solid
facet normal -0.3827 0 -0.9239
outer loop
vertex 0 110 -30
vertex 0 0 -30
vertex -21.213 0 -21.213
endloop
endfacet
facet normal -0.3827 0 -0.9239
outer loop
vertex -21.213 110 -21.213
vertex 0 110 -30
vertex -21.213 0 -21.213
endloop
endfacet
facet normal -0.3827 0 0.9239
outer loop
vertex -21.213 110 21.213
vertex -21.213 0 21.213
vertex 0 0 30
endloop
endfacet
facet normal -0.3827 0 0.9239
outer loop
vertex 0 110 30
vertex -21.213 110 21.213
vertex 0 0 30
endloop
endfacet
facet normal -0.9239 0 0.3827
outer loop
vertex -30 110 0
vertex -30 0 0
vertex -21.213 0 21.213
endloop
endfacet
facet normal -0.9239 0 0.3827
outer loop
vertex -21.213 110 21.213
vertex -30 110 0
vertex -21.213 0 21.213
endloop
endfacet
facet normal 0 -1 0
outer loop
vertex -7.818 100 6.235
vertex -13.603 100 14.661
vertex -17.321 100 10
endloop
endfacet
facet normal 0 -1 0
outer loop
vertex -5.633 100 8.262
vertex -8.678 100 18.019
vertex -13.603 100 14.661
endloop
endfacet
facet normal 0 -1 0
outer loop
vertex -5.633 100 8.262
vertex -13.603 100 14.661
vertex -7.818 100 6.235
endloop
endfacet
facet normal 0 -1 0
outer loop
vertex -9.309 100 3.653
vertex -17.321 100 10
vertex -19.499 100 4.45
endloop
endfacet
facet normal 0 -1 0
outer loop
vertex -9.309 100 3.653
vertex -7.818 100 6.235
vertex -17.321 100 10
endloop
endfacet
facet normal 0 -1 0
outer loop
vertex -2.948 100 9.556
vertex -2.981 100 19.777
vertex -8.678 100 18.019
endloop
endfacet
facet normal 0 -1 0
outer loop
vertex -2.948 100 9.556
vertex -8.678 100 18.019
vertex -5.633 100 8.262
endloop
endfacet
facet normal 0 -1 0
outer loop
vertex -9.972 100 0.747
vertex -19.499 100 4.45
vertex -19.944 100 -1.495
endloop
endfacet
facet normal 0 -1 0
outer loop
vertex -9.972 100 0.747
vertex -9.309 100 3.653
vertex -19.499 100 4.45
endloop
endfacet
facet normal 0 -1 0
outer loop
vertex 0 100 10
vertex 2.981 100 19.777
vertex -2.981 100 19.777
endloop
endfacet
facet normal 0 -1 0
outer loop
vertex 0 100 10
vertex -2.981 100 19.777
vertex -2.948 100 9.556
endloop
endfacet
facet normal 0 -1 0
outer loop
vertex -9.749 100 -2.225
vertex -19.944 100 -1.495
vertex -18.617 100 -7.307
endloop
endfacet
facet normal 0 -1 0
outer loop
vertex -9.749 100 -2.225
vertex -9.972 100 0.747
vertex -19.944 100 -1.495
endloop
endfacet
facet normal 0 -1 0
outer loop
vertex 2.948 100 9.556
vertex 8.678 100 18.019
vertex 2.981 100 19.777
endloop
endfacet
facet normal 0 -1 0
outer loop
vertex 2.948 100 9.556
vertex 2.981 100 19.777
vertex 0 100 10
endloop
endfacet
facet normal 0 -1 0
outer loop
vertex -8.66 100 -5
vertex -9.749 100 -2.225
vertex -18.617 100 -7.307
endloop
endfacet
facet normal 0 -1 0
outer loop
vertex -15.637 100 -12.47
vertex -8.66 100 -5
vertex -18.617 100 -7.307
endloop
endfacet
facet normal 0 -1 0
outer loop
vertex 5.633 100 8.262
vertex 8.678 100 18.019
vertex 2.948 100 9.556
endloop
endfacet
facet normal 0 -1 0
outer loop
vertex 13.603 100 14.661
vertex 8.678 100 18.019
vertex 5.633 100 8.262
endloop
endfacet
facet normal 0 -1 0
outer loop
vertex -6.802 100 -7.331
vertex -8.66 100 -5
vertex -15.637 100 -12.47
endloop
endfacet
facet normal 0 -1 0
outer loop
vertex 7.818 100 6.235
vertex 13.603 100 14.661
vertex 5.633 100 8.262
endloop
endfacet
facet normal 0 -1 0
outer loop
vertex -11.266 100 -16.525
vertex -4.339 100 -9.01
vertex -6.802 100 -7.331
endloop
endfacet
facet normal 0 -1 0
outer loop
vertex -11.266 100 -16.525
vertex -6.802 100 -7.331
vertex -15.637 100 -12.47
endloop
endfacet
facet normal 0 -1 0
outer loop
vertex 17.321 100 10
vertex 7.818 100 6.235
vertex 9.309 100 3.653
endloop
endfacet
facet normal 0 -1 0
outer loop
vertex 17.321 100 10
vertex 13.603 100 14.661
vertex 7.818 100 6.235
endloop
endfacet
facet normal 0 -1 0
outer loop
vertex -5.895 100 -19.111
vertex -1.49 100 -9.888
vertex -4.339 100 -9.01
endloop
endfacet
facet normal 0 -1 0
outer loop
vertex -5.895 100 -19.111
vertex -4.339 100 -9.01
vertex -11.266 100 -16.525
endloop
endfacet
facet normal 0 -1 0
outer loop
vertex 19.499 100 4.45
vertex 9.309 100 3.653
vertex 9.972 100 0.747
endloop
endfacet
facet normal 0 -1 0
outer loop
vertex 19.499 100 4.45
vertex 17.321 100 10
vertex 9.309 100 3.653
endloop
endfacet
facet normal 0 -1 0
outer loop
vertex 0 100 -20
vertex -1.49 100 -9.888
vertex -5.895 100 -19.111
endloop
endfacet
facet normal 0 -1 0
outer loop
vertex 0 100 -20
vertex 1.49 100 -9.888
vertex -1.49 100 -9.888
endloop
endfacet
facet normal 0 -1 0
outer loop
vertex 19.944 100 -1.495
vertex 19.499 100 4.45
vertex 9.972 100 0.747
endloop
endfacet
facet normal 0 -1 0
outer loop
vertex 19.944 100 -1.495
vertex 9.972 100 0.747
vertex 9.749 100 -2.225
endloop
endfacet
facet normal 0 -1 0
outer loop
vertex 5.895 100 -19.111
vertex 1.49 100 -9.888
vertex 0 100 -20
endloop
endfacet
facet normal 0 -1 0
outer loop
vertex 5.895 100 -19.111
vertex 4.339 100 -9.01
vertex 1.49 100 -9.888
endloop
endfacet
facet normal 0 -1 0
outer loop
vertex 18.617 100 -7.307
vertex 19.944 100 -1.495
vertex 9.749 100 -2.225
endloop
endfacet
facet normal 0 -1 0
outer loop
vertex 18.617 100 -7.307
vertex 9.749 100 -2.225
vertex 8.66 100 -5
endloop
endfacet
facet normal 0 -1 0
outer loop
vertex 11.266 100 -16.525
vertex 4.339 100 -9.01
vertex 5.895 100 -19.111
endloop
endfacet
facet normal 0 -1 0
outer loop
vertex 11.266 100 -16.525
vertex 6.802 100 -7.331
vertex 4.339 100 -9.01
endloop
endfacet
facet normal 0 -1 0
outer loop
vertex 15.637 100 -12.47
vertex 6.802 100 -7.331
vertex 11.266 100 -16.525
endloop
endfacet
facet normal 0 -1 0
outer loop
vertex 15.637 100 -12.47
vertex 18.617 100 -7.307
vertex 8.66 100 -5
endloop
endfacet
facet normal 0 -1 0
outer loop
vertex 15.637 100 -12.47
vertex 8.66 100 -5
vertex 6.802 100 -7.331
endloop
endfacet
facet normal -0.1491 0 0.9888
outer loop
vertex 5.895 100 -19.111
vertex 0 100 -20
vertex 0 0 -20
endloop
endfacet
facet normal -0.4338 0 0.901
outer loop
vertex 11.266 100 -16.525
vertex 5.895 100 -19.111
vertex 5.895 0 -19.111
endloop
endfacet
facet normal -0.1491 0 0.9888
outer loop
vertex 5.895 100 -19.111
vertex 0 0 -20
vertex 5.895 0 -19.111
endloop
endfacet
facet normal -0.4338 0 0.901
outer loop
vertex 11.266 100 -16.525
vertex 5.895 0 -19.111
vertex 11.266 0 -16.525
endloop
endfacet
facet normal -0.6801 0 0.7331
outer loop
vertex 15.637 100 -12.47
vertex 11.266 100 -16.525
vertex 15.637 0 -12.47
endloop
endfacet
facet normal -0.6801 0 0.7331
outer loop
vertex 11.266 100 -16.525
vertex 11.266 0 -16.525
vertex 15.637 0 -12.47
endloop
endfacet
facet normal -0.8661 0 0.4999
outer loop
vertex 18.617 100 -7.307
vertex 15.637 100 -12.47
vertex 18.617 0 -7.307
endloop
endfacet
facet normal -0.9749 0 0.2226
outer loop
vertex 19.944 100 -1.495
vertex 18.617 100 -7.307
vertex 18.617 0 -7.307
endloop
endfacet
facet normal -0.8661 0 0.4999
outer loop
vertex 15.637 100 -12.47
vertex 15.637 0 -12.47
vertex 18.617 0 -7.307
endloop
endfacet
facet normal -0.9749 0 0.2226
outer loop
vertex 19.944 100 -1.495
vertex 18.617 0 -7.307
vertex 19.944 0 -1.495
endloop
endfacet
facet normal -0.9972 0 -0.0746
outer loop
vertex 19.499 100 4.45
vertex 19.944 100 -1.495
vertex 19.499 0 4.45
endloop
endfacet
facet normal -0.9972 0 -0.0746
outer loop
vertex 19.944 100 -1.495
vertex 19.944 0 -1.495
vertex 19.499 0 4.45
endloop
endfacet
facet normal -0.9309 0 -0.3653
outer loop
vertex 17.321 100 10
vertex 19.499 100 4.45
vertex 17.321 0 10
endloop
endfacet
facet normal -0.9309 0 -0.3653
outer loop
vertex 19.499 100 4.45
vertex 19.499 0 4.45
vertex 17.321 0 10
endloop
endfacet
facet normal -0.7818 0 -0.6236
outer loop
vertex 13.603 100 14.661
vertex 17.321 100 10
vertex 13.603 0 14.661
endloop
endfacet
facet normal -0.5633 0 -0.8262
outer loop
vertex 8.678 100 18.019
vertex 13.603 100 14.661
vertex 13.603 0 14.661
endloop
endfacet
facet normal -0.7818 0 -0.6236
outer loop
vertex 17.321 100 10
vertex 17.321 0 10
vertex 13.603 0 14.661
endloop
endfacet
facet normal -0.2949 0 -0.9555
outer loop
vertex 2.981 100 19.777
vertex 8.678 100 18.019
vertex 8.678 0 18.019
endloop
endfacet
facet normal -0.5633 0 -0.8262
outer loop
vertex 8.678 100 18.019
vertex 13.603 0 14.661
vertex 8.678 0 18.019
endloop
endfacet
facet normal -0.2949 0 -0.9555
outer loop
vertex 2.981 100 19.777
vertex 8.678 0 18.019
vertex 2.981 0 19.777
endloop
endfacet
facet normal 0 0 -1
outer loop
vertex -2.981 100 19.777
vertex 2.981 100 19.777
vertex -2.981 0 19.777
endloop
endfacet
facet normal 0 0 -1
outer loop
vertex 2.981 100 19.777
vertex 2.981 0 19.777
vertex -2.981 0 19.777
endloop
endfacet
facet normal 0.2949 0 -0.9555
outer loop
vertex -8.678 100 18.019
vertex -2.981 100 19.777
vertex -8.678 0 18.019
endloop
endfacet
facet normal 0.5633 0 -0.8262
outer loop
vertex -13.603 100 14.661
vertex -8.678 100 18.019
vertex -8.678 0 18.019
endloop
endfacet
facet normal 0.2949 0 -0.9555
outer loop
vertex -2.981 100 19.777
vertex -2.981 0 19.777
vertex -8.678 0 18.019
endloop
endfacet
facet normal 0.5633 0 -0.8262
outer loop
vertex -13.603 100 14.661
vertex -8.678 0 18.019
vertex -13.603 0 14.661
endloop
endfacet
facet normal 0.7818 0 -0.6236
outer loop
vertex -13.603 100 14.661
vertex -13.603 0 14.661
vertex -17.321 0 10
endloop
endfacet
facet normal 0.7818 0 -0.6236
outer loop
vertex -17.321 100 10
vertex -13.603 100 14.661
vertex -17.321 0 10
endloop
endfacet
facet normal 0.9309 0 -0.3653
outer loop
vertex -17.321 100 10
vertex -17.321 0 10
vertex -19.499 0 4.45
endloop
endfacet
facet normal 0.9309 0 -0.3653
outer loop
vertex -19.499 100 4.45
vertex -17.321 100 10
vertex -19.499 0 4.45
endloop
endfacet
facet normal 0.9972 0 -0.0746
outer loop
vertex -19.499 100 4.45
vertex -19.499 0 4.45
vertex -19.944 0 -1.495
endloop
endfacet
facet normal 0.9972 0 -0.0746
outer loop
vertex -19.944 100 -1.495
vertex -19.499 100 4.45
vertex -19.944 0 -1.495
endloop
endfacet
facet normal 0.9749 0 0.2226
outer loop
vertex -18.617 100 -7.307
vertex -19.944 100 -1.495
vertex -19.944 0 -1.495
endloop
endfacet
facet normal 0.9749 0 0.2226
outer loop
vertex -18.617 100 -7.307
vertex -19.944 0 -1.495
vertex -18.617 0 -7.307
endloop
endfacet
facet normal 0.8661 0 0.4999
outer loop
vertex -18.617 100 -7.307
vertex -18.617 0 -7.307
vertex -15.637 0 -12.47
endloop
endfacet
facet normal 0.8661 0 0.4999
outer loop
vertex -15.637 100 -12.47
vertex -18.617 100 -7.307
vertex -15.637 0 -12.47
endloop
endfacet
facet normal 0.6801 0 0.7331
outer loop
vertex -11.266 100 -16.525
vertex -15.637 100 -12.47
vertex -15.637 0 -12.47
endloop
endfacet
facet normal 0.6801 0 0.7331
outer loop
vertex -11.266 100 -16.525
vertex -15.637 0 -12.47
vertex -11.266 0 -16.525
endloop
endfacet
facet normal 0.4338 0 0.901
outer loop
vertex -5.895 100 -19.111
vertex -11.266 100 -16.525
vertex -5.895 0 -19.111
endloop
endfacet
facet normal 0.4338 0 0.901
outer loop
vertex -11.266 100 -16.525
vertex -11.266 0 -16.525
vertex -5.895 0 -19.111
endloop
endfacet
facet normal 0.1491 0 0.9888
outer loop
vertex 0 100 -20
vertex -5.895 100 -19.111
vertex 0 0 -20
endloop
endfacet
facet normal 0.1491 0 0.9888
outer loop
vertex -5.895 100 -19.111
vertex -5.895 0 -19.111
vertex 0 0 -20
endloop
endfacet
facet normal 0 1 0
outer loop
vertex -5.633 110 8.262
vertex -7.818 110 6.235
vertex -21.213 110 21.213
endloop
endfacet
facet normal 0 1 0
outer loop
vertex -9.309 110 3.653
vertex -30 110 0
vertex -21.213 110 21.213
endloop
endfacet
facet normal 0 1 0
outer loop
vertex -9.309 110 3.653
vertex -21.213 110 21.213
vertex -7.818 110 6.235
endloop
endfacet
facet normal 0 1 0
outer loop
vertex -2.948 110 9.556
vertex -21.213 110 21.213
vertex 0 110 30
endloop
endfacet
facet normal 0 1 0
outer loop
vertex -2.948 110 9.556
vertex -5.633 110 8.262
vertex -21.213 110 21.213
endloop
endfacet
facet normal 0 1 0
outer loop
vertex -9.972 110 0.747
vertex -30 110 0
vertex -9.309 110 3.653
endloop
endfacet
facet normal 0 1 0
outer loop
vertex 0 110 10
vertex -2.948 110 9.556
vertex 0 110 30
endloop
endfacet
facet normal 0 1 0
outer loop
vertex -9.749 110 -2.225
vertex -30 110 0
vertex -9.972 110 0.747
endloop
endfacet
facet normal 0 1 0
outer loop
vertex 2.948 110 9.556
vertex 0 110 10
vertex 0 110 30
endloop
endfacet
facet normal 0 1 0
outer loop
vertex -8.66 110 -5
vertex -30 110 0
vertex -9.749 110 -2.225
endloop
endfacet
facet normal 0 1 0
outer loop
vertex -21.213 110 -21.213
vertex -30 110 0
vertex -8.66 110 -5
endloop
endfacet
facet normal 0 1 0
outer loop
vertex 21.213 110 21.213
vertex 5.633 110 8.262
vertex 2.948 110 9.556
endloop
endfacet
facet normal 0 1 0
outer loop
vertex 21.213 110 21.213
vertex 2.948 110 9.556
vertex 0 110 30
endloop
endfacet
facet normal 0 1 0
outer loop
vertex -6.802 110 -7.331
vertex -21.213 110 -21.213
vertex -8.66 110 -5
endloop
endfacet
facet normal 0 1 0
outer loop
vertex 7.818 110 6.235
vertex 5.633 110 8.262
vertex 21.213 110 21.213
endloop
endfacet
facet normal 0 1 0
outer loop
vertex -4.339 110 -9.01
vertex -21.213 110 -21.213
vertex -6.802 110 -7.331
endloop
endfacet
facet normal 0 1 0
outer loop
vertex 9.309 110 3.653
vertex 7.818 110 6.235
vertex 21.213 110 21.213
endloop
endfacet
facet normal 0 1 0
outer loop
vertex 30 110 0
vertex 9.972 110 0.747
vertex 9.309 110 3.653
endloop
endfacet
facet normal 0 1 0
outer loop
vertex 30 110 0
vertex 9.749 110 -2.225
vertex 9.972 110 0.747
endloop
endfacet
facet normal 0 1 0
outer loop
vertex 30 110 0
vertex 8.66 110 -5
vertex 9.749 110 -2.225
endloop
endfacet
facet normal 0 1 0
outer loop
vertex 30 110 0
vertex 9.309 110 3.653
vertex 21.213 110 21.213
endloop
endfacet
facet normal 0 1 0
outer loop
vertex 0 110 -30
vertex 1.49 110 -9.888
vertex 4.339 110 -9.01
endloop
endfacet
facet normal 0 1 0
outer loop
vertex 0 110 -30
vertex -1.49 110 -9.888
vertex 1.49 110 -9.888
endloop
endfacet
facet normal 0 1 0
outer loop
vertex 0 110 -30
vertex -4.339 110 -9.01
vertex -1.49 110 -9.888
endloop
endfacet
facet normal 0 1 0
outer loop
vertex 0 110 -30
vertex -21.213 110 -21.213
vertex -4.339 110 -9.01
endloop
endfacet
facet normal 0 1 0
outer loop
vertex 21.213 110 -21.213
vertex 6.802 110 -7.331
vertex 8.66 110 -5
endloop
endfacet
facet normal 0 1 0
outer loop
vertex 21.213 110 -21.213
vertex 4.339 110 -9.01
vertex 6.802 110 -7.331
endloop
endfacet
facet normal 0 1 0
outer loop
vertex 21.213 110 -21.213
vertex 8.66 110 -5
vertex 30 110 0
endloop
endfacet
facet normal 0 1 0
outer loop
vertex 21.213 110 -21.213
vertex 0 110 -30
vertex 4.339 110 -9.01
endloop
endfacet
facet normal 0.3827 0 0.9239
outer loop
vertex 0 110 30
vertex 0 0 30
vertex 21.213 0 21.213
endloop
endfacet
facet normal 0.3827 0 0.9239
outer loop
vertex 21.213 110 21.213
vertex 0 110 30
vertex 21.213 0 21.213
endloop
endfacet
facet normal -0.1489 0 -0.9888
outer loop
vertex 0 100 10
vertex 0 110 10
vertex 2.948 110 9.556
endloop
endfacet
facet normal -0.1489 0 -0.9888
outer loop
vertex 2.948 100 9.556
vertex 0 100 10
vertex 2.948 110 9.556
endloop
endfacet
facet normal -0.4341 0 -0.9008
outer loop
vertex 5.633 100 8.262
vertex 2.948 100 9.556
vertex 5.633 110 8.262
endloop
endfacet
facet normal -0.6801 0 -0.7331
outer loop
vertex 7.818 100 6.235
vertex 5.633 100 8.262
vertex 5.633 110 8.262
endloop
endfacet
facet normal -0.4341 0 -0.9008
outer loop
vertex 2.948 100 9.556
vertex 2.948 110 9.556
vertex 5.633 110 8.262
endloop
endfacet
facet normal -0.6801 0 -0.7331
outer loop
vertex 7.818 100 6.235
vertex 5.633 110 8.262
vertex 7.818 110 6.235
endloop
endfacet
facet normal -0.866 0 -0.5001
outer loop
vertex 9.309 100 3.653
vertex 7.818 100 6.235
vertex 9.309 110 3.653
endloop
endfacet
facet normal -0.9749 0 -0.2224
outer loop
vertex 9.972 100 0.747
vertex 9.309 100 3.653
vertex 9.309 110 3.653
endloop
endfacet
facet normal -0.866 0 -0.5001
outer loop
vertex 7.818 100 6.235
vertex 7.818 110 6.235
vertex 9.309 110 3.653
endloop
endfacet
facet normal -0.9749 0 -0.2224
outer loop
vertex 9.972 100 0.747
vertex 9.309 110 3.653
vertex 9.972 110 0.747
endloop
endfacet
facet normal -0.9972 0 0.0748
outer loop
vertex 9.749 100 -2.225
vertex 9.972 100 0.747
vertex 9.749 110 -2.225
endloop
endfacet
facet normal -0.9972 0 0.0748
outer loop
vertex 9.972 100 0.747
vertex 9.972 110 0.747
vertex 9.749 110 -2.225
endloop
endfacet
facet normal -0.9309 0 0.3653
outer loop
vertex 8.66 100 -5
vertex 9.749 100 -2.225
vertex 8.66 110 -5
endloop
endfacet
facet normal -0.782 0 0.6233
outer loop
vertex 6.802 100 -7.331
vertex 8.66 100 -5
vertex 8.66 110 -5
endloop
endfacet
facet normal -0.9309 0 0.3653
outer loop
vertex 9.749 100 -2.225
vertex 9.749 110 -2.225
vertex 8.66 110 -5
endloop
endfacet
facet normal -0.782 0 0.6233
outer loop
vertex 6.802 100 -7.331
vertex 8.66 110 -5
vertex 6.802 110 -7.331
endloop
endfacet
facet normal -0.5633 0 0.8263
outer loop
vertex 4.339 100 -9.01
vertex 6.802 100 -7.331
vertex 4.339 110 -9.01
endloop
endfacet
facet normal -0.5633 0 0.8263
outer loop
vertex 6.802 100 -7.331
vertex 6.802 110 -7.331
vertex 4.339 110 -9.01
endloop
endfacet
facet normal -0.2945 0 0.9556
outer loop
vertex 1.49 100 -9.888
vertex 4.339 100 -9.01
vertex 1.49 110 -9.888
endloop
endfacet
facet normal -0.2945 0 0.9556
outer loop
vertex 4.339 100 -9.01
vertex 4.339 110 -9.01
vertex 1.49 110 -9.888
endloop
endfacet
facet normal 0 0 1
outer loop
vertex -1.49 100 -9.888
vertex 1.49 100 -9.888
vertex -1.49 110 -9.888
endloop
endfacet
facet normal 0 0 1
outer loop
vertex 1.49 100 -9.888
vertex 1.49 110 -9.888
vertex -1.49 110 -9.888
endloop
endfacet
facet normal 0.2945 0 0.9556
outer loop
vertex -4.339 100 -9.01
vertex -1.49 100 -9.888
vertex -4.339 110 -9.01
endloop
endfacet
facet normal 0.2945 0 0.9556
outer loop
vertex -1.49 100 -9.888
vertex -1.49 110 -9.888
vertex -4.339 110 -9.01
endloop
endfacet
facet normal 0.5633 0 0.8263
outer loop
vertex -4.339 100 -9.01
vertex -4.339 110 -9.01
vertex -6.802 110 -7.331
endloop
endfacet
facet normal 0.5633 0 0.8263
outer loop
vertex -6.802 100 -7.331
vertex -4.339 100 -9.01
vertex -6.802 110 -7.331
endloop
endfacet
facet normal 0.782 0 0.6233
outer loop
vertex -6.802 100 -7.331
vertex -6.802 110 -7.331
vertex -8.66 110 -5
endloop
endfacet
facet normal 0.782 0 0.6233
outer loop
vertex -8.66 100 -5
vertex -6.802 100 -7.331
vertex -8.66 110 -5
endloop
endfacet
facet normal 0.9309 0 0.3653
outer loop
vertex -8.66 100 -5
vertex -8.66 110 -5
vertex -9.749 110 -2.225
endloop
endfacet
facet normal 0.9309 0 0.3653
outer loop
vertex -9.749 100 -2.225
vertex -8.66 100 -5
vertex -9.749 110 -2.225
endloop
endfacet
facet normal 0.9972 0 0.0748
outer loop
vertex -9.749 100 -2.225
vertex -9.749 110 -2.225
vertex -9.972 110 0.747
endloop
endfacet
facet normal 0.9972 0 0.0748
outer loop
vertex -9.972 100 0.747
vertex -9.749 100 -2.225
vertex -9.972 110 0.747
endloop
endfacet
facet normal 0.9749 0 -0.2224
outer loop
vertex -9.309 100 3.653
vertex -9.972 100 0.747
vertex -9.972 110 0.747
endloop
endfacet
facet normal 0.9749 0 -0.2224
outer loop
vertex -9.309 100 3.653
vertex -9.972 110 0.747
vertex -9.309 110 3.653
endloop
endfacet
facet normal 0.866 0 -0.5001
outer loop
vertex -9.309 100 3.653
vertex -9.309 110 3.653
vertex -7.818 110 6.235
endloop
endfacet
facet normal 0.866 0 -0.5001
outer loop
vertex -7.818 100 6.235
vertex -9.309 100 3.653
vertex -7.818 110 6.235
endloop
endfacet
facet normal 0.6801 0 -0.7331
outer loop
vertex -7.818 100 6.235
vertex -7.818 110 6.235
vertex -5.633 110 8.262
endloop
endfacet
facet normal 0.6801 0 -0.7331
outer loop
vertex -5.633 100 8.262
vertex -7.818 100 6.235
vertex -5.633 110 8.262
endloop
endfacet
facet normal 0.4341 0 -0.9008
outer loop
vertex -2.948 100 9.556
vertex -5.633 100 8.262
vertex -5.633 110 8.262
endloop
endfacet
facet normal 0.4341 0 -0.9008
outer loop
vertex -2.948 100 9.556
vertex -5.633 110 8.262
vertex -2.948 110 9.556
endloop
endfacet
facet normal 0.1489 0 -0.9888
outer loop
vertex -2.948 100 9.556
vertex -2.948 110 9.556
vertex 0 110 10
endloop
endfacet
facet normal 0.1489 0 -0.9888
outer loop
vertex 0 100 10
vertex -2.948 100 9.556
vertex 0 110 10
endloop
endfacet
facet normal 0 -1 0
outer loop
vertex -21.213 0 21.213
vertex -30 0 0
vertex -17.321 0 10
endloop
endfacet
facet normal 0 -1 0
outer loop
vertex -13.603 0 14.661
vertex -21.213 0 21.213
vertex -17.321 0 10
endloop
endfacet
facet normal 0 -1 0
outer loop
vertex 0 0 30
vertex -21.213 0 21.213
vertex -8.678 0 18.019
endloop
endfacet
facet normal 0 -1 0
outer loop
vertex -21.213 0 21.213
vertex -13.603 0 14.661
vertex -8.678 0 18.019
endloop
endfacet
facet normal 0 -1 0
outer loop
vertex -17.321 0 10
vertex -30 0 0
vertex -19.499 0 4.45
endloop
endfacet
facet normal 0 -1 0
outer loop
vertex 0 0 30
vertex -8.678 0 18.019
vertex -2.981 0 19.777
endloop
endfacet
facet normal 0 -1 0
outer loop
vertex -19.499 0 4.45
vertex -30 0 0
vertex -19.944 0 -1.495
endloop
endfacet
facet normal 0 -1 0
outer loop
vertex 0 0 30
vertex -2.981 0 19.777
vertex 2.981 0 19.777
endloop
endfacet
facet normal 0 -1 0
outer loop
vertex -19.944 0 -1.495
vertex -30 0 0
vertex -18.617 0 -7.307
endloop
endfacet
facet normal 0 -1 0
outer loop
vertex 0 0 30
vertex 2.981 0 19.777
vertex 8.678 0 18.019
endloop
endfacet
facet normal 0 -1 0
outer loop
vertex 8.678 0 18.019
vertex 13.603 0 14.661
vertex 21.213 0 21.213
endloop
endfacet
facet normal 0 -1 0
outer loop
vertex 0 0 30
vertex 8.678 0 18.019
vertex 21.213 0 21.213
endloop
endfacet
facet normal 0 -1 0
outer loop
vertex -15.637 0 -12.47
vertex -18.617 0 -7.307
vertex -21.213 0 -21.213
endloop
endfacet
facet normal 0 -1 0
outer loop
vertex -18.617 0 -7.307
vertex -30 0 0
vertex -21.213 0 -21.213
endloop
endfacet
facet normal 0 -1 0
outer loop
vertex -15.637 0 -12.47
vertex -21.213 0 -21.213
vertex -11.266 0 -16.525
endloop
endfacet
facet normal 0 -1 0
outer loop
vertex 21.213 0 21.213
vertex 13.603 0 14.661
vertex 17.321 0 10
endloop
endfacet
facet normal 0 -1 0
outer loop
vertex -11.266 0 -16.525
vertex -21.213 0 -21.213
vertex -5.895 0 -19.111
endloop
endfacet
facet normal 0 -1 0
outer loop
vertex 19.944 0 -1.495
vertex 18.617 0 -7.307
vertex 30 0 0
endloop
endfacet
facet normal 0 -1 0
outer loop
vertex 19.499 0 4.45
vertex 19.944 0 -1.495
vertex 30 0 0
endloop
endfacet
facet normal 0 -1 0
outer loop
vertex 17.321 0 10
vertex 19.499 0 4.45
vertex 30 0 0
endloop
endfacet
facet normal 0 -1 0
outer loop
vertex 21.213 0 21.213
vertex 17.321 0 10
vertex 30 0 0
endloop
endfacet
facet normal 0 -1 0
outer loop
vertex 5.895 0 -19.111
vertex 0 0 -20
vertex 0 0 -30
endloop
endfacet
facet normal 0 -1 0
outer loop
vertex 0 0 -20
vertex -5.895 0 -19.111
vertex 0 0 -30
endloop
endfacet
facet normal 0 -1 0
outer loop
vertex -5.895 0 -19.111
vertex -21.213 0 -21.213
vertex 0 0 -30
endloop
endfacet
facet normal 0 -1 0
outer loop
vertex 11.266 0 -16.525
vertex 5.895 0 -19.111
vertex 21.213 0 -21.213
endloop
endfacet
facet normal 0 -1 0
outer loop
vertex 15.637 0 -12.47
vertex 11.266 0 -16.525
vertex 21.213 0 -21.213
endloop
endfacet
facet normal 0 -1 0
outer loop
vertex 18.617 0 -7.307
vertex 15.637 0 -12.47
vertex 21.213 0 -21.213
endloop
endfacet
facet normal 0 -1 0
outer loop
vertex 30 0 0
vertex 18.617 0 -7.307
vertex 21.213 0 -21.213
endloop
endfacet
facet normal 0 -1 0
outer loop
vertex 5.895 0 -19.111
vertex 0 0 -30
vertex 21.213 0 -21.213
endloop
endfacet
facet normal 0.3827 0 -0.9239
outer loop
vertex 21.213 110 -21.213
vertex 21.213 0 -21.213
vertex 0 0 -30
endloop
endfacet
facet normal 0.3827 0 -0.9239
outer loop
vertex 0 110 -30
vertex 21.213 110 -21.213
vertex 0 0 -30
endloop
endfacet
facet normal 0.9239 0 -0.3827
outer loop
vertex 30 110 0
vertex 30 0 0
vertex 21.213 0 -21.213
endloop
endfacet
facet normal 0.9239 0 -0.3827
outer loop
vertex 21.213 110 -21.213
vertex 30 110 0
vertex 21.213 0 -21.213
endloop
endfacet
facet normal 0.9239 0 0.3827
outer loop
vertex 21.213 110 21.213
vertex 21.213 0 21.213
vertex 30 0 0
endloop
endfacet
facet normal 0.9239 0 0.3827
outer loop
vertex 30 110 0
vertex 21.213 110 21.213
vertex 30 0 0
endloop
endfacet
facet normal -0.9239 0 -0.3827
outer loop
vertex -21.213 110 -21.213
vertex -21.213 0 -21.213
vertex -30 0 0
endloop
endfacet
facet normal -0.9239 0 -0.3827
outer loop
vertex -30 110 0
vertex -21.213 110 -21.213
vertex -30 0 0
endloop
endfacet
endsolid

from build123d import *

# Parameters (mm, degrees)
BOSS_EXTRUDE1_DEPTH = 110
SKETCH2_R           = 10
CUT_EXTRUDE1_DEPTH  = 110
SKETCH3_R           = 20
CUT_EXTRUDE2_DEPTH  = 100


with BuildPart() as part:
    # Sketch1 → Boss-Extrude1 (new body)
    with BuildSketch(Plane(origin=(0, 0, 0), x_dir=(1, 0, 0), z_dir=(0, 1, 0))):
        Polygon((30, 0), (21.213203436, 21.213203436), (0, 30), (-21.213203436, 21.213203436), (-30, 0), (-21.213203436, -21.213203436), (0, -30), (21.213203436, -21.213203436), align=None)
    extrude(amount=BOSS_EXTRUDE1_DEPTH)

    # Sketch2 → Cut-Extrude1 (cut)
    with BuildSketch(Plane(origin=(0, 110, 0), x_dir=(1, 0, 0), z_dir=(0, 1, 0))):
        with Locations(Location((0, 0, 0), (0, 0, 270))):
            Circle(SKETCH2_R)
    extrude(amount=-CUT_EXTRUDE1_DEPTH, mode=Mode.SUBTRACT)

    # Sketch3 → Cut-Extrude2 (cut)
    with BuildSketch(Plane.XZ):
        with Locations(Location((0, 0, 0), (0, 0, 270))):
            Circle(SKETCH3_R)
    extrude(amount=-CUT_EXTRUDE2_DEPTH, mode=Mode.SUBTRACT)


solid = part.part
